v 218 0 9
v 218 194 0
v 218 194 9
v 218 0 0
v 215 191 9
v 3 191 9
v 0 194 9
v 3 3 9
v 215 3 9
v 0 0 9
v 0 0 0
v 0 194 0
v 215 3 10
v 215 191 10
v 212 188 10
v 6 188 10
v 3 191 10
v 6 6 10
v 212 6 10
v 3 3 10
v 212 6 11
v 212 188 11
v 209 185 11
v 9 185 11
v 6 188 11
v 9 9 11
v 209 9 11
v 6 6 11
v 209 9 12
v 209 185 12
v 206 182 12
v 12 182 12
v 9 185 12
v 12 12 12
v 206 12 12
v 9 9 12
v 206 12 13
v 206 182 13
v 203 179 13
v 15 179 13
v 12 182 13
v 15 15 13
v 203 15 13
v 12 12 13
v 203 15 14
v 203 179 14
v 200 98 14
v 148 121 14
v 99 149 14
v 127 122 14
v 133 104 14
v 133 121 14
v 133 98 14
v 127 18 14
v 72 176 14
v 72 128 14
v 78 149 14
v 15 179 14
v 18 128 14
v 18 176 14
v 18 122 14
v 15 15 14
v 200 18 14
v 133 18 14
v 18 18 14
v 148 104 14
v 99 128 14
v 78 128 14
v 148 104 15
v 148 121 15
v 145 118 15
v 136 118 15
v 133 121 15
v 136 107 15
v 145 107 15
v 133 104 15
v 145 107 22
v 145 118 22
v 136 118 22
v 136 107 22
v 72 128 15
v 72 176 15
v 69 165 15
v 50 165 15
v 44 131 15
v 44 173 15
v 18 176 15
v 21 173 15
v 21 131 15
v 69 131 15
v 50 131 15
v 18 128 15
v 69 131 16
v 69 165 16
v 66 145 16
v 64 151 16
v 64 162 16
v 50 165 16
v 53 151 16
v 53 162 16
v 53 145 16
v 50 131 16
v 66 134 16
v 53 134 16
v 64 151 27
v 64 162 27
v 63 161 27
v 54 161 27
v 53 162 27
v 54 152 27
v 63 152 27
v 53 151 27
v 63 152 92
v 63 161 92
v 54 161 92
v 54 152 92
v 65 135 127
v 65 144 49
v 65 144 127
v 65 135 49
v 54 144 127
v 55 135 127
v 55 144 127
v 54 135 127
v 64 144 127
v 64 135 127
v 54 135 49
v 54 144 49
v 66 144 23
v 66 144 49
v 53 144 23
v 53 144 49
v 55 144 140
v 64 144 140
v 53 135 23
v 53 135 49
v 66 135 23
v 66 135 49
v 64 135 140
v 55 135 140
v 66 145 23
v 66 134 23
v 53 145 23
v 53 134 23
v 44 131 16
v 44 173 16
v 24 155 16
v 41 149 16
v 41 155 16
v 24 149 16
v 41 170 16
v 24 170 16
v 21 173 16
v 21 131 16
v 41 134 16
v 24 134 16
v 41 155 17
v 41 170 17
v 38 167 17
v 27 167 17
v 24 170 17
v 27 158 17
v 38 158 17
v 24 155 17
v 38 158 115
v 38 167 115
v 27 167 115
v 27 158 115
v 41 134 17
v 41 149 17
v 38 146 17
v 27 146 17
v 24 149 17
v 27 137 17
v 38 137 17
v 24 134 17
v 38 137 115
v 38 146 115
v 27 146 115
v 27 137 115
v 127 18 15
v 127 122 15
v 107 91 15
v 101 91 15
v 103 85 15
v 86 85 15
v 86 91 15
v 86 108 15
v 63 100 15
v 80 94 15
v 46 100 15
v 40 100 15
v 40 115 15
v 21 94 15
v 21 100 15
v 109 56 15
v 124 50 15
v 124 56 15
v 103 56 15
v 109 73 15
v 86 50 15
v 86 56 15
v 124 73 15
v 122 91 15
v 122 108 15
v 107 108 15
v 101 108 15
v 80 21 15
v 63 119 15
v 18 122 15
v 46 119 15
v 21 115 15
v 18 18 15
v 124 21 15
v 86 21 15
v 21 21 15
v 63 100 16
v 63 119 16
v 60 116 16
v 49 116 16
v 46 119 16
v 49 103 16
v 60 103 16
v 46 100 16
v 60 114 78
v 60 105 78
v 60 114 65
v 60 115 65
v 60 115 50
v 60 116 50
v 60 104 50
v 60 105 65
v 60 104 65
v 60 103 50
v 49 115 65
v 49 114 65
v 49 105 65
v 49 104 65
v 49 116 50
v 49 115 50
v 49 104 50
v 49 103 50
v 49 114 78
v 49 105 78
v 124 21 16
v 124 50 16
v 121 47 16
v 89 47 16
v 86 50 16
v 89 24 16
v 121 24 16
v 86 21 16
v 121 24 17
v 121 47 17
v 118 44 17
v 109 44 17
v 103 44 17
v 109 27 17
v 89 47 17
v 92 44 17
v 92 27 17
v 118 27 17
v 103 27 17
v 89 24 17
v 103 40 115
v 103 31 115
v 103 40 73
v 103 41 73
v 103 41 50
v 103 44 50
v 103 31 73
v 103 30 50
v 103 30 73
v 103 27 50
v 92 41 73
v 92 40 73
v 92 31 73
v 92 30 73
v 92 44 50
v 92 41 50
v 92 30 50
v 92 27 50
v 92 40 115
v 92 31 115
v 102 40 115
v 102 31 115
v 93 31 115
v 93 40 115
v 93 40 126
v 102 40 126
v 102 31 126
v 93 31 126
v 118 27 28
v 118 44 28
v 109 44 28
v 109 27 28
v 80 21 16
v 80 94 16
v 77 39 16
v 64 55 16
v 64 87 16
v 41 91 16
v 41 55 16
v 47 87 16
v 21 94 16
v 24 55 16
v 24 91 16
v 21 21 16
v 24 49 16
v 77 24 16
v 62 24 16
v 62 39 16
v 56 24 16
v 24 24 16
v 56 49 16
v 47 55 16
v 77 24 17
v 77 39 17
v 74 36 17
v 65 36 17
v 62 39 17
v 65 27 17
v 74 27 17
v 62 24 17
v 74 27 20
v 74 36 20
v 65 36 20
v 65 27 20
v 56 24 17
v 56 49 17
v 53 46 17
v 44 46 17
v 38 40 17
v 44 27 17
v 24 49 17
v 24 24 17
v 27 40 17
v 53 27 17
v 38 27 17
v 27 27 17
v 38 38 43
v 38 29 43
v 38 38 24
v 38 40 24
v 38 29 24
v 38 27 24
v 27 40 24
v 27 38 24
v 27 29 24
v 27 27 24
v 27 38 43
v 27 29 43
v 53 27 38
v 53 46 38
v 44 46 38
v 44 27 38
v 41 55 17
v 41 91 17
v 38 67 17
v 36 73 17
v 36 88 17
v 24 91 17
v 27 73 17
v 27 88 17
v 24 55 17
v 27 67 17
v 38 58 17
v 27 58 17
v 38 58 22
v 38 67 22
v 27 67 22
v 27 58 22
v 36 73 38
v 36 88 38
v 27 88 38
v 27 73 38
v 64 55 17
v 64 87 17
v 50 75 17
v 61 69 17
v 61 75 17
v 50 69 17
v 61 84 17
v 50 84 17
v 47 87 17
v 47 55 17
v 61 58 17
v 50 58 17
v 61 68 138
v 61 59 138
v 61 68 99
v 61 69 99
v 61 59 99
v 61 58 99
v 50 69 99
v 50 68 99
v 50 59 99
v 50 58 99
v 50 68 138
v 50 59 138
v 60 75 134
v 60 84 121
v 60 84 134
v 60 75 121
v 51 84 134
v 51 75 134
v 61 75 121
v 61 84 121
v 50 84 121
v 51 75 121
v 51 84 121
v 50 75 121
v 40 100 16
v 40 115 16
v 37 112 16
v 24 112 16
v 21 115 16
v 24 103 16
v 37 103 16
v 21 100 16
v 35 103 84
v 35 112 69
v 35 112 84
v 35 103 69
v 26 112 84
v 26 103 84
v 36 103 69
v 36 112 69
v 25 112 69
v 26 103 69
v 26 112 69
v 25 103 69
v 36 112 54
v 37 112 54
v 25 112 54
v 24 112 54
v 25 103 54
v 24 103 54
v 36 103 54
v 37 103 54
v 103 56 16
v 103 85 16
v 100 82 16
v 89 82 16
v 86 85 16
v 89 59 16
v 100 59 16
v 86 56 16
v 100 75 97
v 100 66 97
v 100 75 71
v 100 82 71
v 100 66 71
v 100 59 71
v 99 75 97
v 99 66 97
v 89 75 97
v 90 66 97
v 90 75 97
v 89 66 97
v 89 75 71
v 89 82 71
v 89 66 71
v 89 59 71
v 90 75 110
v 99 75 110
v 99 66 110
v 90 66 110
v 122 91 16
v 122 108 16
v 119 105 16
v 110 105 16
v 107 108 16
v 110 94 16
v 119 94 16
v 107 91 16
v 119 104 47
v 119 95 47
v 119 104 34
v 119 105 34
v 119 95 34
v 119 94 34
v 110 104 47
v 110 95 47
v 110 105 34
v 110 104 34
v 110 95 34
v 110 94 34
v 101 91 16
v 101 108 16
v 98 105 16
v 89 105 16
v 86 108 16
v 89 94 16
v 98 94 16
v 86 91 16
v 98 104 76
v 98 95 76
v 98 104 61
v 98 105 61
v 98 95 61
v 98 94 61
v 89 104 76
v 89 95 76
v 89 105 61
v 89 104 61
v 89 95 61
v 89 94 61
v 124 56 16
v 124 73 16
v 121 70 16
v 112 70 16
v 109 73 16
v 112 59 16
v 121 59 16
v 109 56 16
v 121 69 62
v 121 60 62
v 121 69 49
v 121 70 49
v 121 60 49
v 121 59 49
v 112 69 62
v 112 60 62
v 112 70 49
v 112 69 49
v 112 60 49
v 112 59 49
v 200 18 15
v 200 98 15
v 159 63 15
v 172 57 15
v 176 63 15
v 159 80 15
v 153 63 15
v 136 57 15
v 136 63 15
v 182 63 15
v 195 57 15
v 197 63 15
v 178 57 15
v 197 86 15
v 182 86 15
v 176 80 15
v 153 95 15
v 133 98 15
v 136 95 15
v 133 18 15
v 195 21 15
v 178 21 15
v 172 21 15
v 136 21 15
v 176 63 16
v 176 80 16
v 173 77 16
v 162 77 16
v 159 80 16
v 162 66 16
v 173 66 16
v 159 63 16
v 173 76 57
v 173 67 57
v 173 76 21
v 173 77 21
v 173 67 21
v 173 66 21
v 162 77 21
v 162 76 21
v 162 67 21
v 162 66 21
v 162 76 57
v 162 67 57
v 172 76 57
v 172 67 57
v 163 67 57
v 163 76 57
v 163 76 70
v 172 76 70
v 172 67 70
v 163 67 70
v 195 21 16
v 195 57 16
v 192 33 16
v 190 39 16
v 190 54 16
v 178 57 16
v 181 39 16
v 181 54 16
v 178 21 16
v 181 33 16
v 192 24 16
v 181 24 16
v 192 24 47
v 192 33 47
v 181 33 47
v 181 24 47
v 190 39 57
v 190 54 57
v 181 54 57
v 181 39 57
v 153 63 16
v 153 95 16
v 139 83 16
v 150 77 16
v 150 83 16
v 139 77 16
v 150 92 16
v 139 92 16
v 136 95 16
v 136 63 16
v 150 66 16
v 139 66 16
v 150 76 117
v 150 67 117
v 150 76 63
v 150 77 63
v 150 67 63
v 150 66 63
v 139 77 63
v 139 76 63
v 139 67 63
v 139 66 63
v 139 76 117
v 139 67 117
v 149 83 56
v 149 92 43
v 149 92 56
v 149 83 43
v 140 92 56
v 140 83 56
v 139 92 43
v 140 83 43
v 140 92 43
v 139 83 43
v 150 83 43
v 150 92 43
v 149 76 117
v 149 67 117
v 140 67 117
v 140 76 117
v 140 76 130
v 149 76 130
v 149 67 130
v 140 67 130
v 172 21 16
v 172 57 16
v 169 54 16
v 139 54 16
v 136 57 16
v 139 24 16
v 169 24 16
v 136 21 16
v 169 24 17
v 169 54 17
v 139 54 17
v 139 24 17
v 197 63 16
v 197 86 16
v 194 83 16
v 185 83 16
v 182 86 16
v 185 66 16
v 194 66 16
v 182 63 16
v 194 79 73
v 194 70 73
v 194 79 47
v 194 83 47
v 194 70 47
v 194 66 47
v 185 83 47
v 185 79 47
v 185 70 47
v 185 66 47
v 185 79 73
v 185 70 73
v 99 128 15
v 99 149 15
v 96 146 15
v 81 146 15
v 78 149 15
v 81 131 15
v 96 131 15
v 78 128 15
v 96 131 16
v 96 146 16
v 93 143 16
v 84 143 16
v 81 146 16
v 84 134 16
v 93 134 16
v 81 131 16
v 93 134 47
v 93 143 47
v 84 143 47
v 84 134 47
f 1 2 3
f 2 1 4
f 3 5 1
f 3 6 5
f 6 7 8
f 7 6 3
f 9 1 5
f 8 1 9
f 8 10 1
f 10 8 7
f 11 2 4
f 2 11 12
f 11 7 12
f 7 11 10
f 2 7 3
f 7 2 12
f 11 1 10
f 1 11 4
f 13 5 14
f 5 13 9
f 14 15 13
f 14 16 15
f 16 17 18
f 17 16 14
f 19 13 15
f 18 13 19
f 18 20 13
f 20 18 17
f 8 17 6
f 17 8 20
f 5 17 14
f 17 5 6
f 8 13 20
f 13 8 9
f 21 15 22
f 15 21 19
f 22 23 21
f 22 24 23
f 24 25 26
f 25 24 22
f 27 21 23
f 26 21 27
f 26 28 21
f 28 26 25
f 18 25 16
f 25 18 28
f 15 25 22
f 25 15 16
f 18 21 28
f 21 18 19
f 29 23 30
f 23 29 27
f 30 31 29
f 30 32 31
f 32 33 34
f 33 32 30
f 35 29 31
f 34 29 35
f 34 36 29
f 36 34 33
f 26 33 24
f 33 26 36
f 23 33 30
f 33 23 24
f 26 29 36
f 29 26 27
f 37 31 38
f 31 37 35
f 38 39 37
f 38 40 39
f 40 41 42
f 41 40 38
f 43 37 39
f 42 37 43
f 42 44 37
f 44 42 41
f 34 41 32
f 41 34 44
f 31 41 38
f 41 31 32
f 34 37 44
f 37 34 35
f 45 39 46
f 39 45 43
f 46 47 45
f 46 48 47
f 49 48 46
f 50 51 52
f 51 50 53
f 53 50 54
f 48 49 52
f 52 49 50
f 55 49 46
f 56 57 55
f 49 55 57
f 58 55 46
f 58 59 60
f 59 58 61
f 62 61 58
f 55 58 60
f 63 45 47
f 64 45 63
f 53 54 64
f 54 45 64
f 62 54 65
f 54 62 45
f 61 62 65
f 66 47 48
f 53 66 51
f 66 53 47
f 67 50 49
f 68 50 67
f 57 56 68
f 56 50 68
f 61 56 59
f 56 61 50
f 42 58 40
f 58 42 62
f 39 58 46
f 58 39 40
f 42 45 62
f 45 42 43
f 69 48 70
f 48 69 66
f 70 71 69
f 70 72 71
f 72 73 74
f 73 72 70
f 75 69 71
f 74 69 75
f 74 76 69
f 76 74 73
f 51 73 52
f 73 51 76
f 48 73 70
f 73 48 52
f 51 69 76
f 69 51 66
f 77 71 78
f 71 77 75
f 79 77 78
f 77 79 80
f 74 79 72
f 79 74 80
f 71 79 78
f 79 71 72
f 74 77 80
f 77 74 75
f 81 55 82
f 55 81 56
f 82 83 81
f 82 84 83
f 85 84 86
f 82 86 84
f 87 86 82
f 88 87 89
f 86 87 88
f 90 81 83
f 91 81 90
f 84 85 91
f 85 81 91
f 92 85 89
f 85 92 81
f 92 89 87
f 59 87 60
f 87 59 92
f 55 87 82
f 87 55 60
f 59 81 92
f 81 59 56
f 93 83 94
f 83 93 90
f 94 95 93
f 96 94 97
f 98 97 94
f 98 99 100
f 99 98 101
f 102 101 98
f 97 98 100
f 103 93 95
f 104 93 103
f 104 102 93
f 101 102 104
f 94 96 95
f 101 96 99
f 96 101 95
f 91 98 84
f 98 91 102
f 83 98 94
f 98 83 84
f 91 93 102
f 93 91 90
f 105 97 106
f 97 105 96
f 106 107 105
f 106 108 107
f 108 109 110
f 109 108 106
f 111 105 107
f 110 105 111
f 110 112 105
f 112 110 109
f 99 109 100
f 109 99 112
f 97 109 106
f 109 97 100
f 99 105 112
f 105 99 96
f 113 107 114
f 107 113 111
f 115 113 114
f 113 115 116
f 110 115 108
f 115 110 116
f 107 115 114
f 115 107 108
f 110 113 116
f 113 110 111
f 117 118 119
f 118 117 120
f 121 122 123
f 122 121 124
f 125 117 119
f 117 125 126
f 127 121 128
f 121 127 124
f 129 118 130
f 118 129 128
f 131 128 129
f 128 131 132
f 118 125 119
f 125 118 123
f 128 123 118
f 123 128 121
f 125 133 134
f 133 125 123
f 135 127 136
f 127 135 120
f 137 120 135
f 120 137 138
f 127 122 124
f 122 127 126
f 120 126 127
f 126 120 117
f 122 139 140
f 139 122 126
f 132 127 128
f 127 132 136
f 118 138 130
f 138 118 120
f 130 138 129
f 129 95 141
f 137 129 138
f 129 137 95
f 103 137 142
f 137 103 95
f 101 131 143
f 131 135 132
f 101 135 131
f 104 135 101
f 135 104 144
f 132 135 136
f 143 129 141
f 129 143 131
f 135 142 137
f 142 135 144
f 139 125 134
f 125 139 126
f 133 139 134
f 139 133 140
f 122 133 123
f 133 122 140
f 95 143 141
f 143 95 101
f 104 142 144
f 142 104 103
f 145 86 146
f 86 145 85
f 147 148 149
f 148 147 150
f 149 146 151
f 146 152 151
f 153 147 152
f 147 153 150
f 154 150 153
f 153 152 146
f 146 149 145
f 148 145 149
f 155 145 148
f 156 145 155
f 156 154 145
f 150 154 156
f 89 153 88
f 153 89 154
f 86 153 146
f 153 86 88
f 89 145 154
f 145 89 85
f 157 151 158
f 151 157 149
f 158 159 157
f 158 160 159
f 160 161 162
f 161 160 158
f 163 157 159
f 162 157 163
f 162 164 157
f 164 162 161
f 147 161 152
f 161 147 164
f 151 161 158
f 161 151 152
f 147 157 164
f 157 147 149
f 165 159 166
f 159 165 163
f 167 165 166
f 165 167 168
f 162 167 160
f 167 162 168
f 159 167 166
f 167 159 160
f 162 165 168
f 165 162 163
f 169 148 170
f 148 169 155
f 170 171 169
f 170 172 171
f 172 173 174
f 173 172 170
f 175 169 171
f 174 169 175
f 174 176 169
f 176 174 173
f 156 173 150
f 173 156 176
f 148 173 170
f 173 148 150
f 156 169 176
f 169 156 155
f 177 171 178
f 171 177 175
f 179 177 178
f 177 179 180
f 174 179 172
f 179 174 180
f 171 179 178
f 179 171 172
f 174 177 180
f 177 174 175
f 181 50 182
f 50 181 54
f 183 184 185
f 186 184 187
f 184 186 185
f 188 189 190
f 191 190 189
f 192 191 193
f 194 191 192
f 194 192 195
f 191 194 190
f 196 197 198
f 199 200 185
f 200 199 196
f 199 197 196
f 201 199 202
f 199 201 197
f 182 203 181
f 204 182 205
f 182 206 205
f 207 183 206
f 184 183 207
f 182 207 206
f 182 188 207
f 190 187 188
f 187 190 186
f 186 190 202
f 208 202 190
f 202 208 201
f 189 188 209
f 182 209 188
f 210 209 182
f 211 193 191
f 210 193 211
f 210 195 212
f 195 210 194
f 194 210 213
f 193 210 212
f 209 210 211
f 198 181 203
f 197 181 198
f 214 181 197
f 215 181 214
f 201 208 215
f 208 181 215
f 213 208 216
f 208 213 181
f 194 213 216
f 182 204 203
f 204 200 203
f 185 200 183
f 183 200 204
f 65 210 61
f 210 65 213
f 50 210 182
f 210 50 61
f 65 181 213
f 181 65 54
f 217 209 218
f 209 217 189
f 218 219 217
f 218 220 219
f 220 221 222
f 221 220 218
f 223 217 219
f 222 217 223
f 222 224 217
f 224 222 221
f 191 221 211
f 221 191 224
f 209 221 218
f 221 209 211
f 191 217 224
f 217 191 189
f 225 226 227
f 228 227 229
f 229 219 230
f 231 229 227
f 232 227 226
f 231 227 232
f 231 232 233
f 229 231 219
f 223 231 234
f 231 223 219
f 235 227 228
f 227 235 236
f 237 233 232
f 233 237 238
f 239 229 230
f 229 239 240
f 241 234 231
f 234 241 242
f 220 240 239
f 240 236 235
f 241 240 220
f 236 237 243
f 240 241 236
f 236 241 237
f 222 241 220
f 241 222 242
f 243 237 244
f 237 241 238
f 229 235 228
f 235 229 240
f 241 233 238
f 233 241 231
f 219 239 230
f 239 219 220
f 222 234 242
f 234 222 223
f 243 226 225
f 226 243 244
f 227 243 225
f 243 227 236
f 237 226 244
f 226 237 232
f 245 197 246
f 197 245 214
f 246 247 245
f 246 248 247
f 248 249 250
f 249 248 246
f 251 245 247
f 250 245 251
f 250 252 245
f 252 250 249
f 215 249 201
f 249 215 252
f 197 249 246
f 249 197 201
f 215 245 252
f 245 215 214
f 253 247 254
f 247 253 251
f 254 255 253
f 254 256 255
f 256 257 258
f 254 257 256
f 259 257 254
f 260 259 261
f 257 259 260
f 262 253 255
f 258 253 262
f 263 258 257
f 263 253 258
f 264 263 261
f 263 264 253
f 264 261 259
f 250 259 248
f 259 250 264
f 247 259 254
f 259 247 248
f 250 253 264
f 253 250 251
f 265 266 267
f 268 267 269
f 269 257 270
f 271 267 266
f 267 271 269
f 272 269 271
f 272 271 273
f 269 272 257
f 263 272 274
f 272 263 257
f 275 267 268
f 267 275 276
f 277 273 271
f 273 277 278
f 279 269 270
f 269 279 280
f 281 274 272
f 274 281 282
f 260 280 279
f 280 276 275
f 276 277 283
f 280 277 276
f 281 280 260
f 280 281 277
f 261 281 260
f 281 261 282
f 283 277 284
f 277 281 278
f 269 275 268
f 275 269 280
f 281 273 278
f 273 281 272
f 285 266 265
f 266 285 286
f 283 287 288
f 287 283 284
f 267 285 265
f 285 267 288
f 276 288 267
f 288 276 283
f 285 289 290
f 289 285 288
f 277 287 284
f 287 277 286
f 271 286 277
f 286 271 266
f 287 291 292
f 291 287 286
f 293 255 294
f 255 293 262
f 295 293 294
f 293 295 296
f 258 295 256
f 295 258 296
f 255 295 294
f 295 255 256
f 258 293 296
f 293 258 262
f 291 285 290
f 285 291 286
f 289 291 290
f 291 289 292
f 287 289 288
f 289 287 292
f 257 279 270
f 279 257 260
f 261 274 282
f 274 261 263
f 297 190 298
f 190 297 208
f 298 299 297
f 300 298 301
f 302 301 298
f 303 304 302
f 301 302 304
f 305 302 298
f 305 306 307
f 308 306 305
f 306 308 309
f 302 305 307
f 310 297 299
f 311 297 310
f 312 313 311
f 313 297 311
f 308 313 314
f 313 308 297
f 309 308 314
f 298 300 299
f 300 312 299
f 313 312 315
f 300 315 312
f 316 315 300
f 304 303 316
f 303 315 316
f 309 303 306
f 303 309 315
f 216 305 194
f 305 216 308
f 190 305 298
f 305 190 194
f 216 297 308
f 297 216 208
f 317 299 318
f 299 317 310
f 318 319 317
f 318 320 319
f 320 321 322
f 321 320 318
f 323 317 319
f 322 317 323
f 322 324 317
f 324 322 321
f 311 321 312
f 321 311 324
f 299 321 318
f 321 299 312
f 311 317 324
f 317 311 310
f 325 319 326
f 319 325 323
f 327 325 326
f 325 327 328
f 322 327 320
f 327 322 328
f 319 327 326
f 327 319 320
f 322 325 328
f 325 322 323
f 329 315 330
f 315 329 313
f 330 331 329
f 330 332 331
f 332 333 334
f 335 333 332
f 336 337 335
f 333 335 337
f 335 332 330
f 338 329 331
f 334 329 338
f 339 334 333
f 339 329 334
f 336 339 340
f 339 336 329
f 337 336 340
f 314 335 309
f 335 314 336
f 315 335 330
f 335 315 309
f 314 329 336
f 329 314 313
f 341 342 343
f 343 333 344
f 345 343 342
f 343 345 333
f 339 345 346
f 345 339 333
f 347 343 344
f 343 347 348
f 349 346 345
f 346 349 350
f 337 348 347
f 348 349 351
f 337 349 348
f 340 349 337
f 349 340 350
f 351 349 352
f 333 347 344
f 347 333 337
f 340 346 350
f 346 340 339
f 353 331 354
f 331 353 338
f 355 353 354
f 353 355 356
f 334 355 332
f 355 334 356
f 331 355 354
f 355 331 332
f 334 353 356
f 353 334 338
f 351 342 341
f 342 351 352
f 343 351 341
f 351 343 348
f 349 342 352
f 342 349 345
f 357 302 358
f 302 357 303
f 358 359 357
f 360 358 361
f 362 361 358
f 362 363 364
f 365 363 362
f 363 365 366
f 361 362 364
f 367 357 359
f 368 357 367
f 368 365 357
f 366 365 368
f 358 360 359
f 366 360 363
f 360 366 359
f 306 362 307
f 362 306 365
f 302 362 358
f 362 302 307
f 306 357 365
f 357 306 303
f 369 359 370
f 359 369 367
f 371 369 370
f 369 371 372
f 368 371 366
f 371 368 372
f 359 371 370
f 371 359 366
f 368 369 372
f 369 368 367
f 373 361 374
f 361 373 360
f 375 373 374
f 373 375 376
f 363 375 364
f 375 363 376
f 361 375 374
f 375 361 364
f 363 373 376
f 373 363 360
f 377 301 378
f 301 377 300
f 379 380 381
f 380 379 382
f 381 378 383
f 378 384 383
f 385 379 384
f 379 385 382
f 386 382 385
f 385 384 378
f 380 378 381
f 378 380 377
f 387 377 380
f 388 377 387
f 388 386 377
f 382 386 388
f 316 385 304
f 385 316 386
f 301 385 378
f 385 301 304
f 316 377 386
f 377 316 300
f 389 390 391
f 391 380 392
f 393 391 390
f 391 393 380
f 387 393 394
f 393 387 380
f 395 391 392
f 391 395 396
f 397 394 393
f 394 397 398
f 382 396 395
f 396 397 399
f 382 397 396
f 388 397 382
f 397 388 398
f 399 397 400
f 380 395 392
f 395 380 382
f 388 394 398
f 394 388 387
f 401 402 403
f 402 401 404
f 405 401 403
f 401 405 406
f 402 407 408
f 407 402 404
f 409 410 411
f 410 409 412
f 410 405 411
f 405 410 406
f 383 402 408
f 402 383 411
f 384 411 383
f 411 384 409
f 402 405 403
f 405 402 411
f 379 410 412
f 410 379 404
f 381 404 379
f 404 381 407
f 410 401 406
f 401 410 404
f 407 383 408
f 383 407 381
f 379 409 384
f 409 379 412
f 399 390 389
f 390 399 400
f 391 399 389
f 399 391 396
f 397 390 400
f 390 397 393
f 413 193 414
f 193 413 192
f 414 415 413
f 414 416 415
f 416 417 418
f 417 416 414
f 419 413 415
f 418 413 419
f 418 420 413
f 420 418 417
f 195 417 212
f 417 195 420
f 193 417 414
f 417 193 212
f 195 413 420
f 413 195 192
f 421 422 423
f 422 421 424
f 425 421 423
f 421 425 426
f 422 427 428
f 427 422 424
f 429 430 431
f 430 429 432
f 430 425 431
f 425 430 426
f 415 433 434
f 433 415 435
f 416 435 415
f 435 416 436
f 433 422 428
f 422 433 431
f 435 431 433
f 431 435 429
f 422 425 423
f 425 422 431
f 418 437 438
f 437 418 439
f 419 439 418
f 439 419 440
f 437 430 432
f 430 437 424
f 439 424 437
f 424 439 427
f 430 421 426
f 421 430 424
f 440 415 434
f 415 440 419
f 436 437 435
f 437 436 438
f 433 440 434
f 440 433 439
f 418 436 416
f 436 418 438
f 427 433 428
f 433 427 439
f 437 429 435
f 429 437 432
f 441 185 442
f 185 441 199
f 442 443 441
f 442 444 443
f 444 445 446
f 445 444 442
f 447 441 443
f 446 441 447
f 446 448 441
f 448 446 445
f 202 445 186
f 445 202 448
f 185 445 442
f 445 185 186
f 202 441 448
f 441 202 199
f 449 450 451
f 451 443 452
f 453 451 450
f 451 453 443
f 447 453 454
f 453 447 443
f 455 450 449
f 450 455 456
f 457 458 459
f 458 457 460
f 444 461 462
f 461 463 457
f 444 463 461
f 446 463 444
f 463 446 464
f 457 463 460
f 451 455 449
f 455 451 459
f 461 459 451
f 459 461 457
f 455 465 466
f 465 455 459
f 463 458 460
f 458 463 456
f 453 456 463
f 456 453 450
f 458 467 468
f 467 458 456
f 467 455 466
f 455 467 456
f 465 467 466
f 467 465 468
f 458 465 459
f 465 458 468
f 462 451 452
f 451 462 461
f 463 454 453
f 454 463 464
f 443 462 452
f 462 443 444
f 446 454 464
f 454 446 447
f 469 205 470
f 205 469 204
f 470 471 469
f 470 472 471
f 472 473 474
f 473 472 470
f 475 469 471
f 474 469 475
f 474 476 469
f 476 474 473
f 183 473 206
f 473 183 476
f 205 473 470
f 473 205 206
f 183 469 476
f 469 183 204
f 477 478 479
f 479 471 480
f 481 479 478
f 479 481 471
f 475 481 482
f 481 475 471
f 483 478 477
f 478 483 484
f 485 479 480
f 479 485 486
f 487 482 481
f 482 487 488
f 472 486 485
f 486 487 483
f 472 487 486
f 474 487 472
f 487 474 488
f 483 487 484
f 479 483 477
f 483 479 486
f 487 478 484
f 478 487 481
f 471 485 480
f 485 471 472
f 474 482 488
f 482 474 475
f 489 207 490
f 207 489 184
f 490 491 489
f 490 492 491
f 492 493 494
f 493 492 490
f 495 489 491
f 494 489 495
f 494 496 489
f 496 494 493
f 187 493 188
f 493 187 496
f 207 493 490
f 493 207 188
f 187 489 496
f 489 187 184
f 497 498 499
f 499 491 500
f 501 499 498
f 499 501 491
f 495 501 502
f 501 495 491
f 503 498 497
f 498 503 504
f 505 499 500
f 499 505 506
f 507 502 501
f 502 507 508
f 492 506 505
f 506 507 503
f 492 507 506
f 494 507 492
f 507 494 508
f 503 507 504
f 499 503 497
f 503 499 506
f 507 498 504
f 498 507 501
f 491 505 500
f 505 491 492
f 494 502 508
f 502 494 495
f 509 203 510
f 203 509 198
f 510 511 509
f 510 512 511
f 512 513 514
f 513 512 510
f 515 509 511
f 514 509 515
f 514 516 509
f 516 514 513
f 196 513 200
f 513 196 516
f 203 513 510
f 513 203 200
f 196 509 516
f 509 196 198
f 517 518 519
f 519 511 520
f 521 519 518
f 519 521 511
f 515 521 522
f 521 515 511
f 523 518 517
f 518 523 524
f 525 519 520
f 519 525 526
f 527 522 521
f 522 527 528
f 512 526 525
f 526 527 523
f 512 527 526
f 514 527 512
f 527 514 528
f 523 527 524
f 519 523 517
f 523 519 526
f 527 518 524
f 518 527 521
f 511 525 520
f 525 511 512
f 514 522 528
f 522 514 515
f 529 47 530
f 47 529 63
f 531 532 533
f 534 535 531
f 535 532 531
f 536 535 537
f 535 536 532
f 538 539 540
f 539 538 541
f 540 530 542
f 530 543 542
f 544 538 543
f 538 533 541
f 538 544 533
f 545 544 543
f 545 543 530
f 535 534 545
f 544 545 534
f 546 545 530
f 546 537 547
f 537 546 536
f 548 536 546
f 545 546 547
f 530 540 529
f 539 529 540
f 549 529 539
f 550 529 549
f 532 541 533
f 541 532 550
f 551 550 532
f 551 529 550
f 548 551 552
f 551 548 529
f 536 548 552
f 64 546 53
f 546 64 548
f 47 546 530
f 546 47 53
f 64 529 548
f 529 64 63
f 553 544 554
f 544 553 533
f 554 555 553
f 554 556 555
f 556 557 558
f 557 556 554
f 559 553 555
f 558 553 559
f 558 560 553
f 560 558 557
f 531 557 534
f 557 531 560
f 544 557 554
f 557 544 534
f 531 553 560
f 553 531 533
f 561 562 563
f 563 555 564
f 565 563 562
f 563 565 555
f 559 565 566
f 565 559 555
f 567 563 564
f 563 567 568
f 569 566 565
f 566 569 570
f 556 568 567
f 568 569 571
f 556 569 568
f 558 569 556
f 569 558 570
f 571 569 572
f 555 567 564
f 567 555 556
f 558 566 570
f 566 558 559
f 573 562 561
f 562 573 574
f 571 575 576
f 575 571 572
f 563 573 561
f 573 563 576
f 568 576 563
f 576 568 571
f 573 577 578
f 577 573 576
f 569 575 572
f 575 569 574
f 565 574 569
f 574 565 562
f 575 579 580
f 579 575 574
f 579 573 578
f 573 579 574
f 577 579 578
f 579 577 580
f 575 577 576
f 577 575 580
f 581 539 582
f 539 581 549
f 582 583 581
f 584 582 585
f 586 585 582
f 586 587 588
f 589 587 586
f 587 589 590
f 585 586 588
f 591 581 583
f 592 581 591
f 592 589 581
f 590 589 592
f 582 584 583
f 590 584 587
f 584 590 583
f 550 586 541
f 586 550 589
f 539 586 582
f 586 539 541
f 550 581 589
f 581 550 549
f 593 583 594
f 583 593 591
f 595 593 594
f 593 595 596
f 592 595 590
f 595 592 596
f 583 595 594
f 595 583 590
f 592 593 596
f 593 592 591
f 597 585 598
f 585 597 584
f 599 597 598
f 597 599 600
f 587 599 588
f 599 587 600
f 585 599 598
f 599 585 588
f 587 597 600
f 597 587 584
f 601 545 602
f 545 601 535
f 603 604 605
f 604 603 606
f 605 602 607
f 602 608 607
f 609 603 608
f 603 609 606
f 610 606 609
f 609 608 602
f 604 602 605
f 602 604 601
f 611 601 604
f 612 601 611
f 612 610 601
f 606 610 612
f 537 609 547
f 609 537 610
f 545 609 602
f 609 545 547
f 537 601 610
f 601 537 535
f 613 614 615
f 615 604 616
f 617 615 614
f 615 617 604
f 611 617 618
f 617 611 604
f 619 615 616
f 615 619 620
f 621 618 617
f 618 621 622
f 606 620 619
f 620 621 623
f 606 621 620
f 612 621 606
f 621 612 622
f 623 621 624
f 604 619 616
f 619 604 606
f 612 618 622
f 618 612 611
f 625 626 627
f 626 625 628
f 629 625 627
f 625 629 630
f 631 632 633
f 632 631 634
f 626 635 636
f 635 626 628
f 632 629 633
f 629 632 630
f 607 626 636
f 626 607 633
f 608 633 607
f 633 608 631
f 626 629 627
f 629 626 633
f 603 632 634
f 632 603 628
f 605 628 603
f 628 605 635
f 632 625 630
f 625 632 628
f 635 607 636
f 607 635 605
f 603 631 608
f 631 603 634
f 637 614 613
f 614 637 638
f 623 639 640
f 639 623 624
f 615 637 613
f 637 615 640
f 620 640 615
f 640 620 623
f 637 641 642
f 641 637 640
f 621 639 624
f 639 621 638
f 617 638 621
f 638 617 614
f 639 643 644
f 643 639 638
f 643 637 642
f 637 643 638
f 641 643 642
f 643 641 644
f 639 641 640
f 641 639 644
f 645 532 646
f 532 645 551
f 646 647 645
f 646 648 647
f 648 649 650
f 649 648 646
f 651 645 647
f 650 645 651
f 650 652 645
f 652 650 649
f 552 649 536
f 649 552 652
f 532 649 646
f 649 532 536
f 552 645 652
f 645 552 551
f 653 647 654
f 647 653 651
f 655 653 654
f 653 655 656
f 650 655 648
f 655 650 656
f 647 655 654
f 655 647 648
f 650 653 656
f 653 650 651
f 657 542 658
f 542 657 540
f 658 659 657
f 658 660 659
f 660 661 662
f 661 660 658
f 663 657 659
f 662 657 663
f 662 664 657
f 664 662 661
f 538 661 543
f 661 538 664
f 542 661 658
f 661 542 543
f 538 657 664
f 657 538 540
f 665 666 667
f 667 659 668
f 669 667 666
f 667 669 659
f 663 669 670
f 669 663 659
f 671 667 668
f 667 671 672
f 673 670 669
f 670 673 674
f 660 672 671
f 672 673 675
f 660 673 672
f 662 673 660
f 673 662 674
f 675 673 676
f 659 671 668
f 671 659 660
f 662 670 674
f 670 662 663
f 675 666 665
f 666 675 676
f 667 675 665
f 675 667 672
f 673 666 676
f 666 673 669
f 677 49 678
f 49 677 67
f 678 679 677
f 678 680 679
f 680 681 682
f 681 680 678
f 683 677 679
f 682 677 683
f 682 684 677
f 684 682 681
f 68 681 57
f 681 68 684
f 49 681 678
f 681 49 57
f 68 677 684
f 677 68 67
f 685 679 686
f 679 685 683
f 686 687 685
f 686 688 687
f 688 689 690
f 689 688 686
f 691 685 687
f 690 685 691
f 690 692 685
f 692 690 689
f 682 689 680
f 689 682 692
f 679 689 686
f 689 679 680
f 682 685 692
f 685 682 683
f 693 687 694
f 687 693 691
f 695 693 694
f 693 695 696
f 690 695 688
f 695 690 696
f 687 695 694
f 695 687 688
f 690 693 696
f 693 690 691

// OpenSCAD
rotate([0,0,0]){translate([0,0,0]){cube([218,194,9]);}
translate([3,3,1]){cube([212,188,9]);}
translate([6,6,2]){cube([206,182,9]);}
translate([9,9,3]){cube([200,176,9]);}
translate([12,12,4]){cube([194,170,9]);}
translate([15,15,5]){cube([188,164,9]);}
translate([133,104,6]){cube([15,17,9]);}
translate([136,107,7]){cube([9,11,15]);}
translate([18,128,6]){cube([54,48,9]);}
translate([50,131,7]){cube([19,34,9]);}
translate([53,151,8]){cube([11,11,19]);}
translate([54,152,79]){cube([9,9,13]);}
translate([54,135,114]){cube([11,9,13]);}
translate([54,152,66]){cube([9,9,13]);}
translate([54,135,101]){cube([11,9,13]);}
translate([54,152,53]){cube([9,9,13]);}
translate([54,135,88]){cube([11,9,13]);}
translate([54,135,75]){cube([11,9,13]);}
translate([54,135,62]){cube([11,9,13]);}
translate([54,152,40]){cube([9,9,13]);}
translate([54,135,49]){cube([11,9,13]);}
translate([53,135,36]){cube([13,9,13]);}
translate([54,152,27]){cube([9,9,13]);}
translate([53,135,23]){cube([13,9,13]);}
translate([55,135,127]){cube([9,9,13]);}
translate([53,134,8]){cube([13,11,15]);}
translate([21,131,7]){cube([23,42,9]);}
translate([24,155,8]){cube([17,15,9]);}
translate([27,158,100]){cube([11,9,15]);}
translate([27,158,87]){cube([11,9,13]);}
translate([27,158,74]){cube([11,9,13]);}
translate([27,158,61]){cube([11,9,13]);}
translate([27,158,48]){cube([11,9,13]);}
translate([27,158,35]){cube([11,9,13]);}
translate([27,158,22]){cube([11,9,13]);}
translate([27,158,9]){cube([11,9,13]);}
translate([24,134,8]){cube([17,15,9]);}
translate([27,137,100]){cube([11,9,15]);}
translate([27,137,87]){cube([11,9,13]);}
translate([27,137,74]){cube([11,9,13]);}
translate([27,137,61]){cube([11,9,13]);}
translate([27,137,48]){cube([11,9,13]);}
translate([27,137,35]){cube([11,9,13]);}
translate([27,137,22]){cube([11,9,13]);}
translate([27,137,9]){cube([11,9,13]);}
translate([18,18,6]){cube([109,104,9]);}
translate([46,100,7]){cube([17,19,9]);}
translate([49,104,50]){cube([11,11,15]);}
translate([49,103,21]){cube([11,13,29]);}
translate([49,103,8]){cube([11,13,13]);}
translate([49,105,65]){cube([11,9,13]);}
translate([86,21,7]){cube([38,29,9]);}
translate([89,24,8]){cube([32,23,9]);}
translate([92,30,50]){cube([11,11,23]);}
translate([92,31,96]){cube([11,9,19]);}
translate([92,31,73]){cube([11,9,23]);}
translate([109,27,9]){cube([9,17,19]);}
translate([93,31,115]){cube([9,9,11]);}
translate([92,27,9]){cube([11,17,41]);}
translate([21,21,7]){cube([59,73,9]);}
translate([62,24,8]){cube([15,15,9]);}
translate([65,27,9]){cube([9,9,11]);}
translate([24,24,8]){cube([32,25,9]);}
translate([27,27,9]){cube([11,13,15]);}
translate([44,27,9]){cube([9,19,29]);}
translate([27,29,24]){cube([11,9,19]);}
translate([24,55,8]){cube([17,36,9]);}
translate([27,58,9]){cube([11,9,13]);}
translate([27,73,9]){cube([9,15,29]);}
translate([47,55,8]){cube([17,32,9]);}
translate([50,58,82]){cube([11,11,17]);}
translate([50,58,61]){cube([11,11,21]);}
translate([50,58,36]){cube([11,11,25]);}
translate([50,58,9]){cube([11,11,27]);}
translate([51,75,121]){cube([9,9,13]);}
translate([50,75,92]){cube([11,9,29]);}
translate([50,75,63]){cube([11,9,29]);}
translate([50,75,48]){cube([11,9,15]);}
translate([50,75,35]){cube([11,9,13]);}
translate([50,75,22]){cube([11,9,13]);}
translate([50,75,9]){cube([11,9,13]);}
translate([50,59,125]){cube([11,9,13]);}
translate([50,59,112]){cube([11,9,13]);}
translate([50,59,99]){cube([11,9,13]);}
translate([21,100,7]){cube([19,15,9]);}
translate([26,103,69]){cube([9,9,15]);}
translate([24,103,39]){cube([13,9,15]);}
translate([25,103,54]){cube([11,9,15]);}
translate([24,103,8]){cube([13,9,31]);}
translate([86,56,7]){cube([17,29,9]);}
translate([89,66,84]){cube([11,9,13]);}
translate([90,66,97]){cube([9,9,13]);}
translate([89,59,8]){cube([11,23,63]);}
translate([89,66,71]){cube([11,9,13]);}
translate([107,91,7]){cube([15,17,9]);}
translate([110,95,34]){cube([9,9,13]);}
translate([110,94,21]){cube([9,11,13]);}
translate([110,94,8]){cube([9,11,13]);}
translate([86,91,7]){cube([15,17,9]);}
translate([89,95,61]){cube([9,9,15]);}
translate([89,94,44]){cube([9,11,17]);}
translate([89,94,23]){cube([9,11,21]);}
translate([89,94,8]){cube([9,11,15]);}
translate([109,56,7]){cube([15,17,9]);}
translate([112,60,49]){cube([9,9,13]);}
translate([112,59,36]){cube([9,11,13]);}
translate([112,59,23]){cube([9,11,13]);}
translate([112,59,8]){cube([9,11,15]);}
translate([133,18,6]){cube([67,80,9]);}
translate([159,63,7]){cube([17,17,9]);}
translate([162,66,8]){cube([11,11,13]);}
translate([162,67,34]){cube([11,9,23]);}
translate([163,67,57]){cube([9,9,13]);}
translate([162,67,21]){cube([11,9,13]);}
translate([178,21,7]){cube([17,36,9]);}
translate([181,24,8]){cube([11,9,39]);}
translate([181,39,8]){cube([9,15,49]);}
translate([136,63,7]){cube([17,32,9]);}
translate([139,66,50]){cube([11,11,13]);}
translate([140,83,43]){cube([9,9,13]);}
translate([139,66,29]){cube([11,11,21]);}
translate([139,66,8]){cube([11,11,21]);}
translate([139,83,8]){cube([11,9,35]);}
translate([139,67,102]){cube([11,9,15]);}
translate([139,67,89]){cube([11,9,13]);}
translate([139,67,76]){cube([11,9,13]);}
translate([140,67,117]){cube([9,9,13]);}
translate([139,67,63]){cube([11,9,13]);}
translate([136,21,7]){cube([36,36,9]);}
translate([139,24,8]){cube([30,30,9]);}
translate([182,63,7]){cube([15,23,9]);}
translate([185,66,8]){cube([9,17,39]);}
translate([185,70,60]){cube([9,9,13]);}
translate([185,70,47]){cube([9,9,13]);}
translate([78,128,6]){cube([21,21,9]);}
translate([81,131,7]){cube([15,15,9]);}
translate([84,134,34]){cube([9,9,13]);}
translate([84,134,21]){cube([9,9,13]);}
translate([84,134,8]){cube([9,9,13]);}
}
